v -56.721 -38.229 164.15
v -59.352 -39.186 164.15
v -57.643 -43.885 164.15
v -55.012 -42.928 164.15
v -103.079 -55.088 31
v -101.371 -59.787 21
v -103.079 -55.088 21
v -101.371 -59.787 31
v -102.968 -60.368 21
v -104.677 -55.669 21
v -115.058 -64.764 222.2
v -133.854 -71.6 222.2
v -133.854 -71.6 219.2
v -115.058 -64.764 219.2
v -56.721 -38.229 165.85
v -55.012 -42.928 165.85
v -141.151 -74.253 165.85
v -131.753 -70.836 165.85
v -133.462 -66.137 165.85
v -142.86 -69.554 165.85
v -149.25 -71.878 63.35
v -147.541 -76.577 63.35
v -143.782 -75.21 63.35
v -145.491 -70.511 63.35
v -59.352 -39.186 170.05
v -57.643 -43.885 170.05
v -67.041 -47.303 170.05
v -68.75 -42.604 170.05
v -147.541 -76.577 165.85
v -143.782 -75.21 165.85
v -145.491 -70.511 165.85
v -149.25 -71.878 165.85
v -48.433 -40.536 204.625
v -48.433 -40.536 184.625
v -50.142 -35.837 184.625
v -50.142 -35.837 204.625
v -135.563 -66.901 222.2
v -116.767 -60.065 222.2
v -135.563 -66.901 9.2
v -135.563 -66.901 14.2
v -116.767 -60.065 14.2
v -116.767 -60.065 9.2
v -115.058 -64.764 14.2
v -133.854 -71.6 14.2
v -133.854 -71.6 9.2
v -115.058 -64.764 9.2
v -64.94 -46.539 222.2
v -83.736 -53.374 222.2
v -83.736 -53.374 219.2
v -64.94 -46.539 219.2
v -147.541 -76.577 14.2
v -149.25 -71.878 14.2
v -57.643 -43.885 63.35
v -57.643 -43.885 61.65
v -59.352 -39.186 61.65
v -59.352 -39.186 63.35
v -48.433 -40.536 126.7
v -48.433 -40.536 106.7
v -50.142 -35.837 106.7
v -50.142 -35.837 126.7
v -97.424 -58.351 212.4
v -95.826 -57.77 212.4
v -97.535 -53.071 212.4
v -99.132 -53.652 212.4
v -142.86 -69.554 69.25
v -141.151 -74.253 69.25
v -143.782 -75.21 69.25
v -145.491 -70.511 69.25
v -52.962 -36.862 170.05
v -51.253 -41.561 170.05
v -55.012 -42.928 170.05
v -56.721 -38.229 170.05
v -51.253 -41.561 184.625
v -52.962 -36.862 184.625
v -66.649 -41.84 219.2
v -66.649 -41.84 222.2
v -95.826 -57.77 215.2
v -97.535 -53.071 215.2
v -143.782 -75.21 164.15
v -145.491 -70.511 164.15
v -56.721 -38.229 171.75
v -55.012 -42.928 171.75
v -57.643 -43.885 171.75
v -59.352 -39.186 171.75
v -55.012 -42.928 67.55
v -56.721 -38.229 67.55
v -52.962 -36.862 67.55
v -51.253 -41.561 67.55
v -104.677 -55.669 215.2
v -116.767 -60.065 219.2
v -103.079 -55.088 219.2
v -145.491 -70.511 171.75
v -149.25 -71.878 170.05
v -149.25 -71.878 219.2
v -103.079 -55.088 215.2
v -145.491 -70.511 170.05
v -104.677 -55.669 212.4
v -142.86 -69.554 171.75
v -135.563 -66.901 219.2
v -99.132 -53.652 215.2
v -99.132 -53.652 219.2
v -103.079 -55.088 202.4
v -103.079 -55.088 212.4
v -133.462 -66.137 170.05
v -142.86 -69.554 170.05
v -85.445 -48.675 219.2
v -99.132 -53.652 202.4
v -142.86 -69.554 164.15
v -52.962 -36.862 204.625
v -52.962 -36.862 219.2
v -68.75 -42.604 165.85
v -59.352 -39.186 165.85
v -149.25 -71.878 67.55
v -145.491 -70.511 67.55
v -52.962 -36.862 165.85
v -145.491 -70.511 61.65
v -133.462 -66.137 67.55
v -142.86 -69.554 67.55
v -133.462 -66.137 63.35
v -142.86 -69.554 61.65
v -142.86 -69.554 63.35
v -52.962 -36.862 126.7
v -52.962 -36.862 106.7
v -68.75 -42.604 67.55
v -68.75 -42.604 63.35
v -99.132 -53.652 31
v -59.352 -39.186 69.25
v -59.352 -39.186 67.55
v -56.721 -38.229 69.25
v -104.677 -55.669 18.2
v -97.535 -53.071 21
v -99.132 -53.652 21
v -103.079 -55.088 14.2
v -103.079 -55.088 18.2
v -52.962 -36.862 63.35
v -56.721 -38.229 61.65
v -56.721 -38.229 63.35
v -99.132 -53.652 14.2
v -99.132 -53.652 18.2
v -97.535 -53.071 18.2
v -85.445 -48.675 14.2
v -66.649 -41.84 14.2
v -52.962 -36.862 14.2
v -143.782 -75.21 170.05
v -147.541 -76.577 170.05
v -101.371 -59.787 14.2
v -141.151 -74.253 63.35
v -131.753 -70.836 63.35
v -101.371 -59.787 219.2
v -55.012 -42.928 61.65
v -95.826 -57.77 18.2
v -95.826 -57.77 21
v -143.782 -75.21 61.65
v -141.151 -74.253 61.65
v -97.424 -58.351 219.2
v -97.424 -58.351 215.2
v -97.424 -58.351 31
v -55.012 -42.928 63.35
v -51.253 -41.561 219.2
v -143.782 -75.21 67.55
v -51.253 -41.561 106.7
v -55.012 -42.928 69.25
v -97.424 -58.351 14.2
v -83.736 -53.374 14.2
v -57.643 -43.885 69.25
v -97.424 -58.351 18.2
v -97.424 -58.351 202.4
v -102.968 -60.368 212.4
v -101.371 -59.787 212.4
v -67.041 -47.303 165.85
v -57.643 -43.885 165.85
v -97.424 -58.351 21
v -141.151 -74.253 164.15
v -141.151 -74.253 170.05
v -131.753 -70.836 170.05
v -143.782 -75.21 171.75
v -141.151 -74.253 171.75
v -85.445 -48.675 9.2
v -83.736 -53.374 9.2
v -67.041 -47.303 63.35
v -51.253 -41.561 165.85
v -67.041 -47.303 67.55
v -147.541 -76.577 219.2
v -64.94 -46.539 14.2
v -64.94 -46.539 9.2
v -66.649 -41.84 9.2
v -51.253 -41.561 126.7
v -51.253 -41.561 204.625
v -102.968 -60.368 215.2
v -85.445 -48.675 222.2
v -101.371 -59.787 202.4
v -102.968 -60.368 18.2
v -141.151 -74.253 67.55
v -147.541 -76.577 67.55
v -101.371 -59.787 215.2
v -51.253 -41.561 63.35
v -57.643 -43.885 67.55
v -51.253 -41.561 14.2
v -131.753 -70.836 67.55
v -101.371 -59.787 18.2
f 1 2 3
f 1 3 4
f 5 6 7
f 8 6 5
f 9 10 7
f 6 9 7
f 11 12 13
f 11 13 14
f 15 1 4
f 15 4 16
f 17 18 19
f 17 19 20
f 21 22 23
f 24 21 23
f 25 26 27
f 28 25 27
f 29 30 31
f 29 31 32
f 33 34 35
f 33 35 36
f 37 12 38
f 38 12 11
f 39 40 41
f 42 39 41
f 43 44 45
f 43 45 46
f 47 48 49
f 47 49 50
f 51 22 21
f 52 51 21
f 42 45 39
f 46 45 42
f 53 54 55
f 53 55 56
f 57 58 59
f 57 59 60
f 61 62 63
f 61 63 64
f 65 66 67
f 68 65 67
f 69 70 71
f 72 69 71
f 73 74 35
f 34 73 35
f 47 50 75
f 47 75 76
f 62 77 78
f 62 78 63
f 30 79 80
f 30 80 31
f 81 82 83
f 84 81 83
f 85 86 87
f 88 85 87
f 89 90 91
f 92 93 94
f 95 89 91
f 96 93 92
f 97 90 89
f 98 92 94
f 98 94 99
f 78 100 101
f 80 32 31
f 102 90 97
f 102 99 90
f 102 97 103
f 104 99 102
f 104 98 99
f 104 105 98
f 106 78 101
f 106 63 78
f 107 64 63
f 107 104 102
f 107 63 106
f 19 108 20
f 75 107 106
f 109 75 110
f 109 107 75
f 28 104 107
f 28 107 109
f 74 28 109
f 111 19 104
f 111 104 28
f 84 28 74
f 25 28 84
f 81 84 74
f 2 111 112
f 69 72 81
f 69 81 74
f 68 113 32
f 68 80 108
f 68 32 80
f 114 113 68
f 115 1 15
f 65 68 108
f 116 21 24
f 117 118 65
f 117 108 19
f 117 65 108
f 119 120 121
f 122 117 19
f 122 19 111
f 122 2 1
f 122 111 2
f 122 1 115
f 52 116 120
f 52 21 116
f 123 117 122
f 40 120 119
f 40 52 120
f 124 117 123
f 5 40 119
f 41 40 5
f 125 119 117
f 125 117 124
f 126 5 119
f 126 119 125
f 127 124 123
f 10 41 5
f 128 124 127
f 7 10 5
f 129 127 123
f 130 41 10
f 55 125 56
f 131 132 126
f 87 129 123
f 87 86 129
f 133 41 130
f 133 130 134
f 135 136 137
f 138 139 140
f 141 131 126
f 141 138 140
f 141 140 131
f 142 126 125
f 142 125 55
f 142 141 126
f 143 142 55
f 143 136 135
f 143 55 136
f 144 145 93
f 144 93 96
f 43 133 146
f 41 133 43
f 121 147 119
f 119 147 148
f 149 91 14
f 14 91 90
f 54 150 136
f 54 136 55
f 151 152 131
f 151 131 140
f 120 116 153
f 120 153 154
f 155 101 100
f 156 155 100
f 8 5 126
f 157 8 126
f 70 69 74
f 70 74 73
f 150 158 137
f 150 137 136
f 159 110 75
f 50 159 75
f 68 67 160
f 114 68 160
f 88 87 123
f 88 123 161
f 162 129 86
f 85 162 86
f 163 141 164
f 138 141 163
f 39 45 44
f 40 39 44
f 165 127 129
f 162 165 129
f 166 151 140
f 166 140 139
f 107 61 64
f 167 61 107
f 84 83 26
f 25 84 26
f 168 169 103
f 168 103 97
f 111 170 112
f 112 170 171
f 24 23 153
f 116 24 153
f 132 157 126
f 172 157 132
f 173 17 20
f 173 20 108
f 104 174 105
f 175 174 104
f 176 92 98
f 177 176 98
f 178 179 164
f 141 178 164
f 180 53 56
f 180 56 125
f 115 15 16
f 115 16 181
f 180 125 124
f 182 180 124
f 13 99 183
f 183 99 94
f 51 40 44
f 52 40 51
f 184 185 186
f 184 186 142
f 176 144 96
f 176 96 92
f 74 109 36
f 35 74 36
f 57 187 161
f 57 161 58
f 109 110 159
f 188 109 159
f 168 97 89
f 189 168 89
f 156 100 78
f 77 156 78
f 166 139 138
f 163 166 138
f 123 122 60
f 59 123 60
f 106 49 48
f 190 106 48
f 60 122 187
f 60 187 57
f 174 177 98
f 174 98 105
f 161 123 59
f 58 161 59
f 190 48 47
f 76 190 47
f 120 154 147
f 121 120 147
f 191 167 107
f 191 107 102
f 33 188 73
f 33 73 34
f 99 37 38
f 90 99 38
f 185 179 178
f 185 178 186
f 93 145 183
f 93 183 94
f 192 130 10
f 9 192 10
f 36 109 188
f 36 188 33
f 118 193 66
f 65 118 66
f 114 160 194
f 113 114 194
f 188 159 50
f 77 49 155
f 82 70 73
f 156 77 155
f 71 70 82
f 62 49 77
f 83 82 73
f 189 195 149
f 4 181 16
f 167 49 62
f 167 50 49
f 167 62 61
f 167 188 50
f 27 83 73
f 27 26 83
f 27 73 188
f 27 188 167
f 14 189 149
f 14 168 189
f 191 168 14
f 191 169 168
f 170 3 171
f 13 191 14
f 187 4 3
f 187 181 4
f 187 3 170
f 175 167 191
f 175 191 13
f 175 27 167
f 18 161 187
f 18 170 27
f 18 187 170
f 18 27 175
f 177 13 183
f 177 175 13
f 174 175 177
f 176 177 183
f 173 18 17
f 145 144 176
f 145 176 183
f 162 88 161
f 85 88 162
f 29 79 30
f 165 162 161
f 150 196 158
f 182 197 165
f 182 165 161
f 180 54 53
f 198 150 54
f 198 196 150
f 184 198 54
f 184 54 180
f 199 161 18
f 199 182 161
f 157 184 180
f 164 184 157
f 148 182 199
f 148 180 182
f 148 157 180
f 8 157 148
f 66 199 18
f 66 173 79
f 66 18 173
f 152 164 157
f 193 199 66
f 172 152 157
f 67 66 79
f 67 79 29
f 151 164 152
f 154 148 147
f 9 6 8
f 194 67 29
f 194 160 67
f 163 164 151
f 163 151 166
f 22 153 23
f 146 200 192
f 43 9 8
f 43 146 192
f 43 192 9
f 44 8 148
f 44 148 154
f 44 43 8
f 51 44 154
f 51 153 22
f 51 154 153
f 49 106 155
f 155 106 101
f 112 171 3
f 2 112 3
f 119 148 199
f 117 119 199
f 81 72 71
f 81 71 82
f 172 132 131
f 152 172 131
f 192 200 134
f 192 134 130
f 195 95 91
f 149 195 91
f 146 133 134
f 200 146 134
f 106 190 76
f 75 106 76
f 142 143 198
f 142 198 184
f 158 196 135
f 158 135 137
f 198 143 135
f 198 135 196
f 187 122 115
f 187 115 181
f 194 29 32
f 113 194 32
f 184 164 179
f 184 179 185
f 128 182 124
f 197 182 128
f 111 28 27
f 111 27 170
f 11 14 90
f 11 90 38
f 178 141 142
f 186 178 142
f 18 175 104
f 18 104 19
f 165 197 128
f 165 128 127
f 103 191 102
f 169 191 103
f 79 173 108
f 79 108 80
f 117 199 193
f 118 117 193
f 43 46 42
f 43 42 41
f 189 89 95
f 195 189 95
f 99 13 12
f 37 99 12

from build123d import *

# Parameters (mm, degrees)
BOSS_EXTRUDE1_DEPTH = 205
CUT_EXTRUDE3_DEPTH  = 38.907676661
SKETCH5_W           = 20
SKETCH5_H           = 5
SKETCH5_W_2         = 3
SKETCH5_H_2         = 20
SKETCH5_H_3         = 3
BOSS_EXTRUDE2_DEPTH = 5


with BuildPart() as part:
    # Sketch2 → Boss-Extrude1 (new body)
    with BuildSketch(Plane.XY.offset(14.2)):
        Polygon((-52.961538618, -36.862052104), (-51.252736373, -41.56098761), (-147.541457764, -76.577085001), (-149.250260009, -71.878149495), align=None)
    extrude(amount=BOSS_EXTRUDE1_DEPTH)

    # Sketch4 → Cut-Extrude3 (cut, through all)
    with BuildSketch(Plane(origin=(7.362313595, -20.245196221, 0), x_dir=(-0.939787101, -0.341760449, 0), z_dir=(0.341760449, -0.939787101, 0))):
        Polygon((111.499570088, -14.2), (115.699570088, -14.2), (115.699570088, -18.2), (117.399570088, -18.2), (117.399570088, -21), (115.699570088, -21), (115.699570088, -31), (111.499570088, -31), (111.499570088, -21), (109.799570088, -21), (109.799570088, -18.2), (111.499570088, -18.2), align=None)
        Polygon((62.37056233, -67.55), (62.37056233, -63.35), (66.37056233, -63.35), (66.37056233, -61.65), (69.17056233, -61.65), (69.17056233, -63.35), (79.17056233, -63.35), (79.17056233, -67.55), (69.17056233, -67.55), (69.17056233, -69.25), (66.37056233, -69.25), (66.37056233, -67.55), align=None)
        Polygon((115.699570088, -219.2), (111.499570088, -219.2), (111.499570088, -215.2), (109.799570088, -215.2), (109.799570088, -212.4), (111.499570088, -212.4), (111.499570088, -202.4), (115.699570088, -202.4), (115.699570088, -212.4), (117.399570088, -212.4), (117.399570088, -215.2), (115.699570088, -215.2), align=None)
        Polygon((66.37056233, -170.05), (66.37056233, -171.75), (69.17056233, -171.75), (69.17056233, -170.05), (79.17056233, -170.05), (79.17056233, -165.85), (69.17056233, -165.85), (69.17056233, -164.15), (66.37056233, -164.15), (66.37056233, -165.85), (62.37056233, -165.85), (62.37056233, -170.05), align=None)
        Polygon((164.828577846, -165.85), (164.828577846, -170.05), (160.828577846, -170.05), (160.828577846, -171.75), (158.028577846, -171.75), (158.028577846, -170.05), (148.028577846, -170.05), (148.028577846, -165.85), (158.028577846, -165.85), (158.028577846, -164.15), (160.828577846, -164.15), (160.828577846, -165.85), align=None)
        Polygon((160.828577846, -63.35), (160.828577846, -61.65), (158.028577846, -61.65), (158.028577846, -63.35), (148.028577846, -63.35), (148.028577846, -67.55), (158.028577846, -67.55), (158.028577846, -69.25), (160.828577846, -69.25), (160.828577846, -67.55), (164.828577846, -67.55), (164.828577846, -63.35), align=None)
    extrude(amount=-CUT_EXTRUDE3_DEPTH, mode=Mode.SUBTRACT)

    # Sketch5 → Boss-Extrude2 (add)
    with BuildSketch(Plane(origin=(7.362313595, -20.245196221, 0), x_dir=(0.939787101, 0.341760449, 0), z_dir=(0.341760449, -0.939787101, 0))):
        with Locations((-86.935066209, 11.7)):
            Rectangle(SKETCH5_W, SKETCH5_H)
        with Locations((-140.264073967, 11.7)):
            Rectangle(SKETCH5_W, SKETCH5_H)
        with Locations((-60.87056233, 116.7)):
            Rectangle(SKETCH5_W_2, SKETCH5_H_2)
        with Locations((-60.87056233, 194.625)):
            Rectangle(SKETCH5_W_2, SKETCH5_H_2)
        with Locations((-86.935066209, 220.7)):
            Rectangle(SKETCH5_W, SKETCH5_H_3)
        with Locations((-140.264073967, 220.7)):
            Rectangle(SKETCH5_W, SKETCH5_H_3)
    extrude(amount=-BOSS_EXTRUDE2_DEPTH)


solid = part.part
